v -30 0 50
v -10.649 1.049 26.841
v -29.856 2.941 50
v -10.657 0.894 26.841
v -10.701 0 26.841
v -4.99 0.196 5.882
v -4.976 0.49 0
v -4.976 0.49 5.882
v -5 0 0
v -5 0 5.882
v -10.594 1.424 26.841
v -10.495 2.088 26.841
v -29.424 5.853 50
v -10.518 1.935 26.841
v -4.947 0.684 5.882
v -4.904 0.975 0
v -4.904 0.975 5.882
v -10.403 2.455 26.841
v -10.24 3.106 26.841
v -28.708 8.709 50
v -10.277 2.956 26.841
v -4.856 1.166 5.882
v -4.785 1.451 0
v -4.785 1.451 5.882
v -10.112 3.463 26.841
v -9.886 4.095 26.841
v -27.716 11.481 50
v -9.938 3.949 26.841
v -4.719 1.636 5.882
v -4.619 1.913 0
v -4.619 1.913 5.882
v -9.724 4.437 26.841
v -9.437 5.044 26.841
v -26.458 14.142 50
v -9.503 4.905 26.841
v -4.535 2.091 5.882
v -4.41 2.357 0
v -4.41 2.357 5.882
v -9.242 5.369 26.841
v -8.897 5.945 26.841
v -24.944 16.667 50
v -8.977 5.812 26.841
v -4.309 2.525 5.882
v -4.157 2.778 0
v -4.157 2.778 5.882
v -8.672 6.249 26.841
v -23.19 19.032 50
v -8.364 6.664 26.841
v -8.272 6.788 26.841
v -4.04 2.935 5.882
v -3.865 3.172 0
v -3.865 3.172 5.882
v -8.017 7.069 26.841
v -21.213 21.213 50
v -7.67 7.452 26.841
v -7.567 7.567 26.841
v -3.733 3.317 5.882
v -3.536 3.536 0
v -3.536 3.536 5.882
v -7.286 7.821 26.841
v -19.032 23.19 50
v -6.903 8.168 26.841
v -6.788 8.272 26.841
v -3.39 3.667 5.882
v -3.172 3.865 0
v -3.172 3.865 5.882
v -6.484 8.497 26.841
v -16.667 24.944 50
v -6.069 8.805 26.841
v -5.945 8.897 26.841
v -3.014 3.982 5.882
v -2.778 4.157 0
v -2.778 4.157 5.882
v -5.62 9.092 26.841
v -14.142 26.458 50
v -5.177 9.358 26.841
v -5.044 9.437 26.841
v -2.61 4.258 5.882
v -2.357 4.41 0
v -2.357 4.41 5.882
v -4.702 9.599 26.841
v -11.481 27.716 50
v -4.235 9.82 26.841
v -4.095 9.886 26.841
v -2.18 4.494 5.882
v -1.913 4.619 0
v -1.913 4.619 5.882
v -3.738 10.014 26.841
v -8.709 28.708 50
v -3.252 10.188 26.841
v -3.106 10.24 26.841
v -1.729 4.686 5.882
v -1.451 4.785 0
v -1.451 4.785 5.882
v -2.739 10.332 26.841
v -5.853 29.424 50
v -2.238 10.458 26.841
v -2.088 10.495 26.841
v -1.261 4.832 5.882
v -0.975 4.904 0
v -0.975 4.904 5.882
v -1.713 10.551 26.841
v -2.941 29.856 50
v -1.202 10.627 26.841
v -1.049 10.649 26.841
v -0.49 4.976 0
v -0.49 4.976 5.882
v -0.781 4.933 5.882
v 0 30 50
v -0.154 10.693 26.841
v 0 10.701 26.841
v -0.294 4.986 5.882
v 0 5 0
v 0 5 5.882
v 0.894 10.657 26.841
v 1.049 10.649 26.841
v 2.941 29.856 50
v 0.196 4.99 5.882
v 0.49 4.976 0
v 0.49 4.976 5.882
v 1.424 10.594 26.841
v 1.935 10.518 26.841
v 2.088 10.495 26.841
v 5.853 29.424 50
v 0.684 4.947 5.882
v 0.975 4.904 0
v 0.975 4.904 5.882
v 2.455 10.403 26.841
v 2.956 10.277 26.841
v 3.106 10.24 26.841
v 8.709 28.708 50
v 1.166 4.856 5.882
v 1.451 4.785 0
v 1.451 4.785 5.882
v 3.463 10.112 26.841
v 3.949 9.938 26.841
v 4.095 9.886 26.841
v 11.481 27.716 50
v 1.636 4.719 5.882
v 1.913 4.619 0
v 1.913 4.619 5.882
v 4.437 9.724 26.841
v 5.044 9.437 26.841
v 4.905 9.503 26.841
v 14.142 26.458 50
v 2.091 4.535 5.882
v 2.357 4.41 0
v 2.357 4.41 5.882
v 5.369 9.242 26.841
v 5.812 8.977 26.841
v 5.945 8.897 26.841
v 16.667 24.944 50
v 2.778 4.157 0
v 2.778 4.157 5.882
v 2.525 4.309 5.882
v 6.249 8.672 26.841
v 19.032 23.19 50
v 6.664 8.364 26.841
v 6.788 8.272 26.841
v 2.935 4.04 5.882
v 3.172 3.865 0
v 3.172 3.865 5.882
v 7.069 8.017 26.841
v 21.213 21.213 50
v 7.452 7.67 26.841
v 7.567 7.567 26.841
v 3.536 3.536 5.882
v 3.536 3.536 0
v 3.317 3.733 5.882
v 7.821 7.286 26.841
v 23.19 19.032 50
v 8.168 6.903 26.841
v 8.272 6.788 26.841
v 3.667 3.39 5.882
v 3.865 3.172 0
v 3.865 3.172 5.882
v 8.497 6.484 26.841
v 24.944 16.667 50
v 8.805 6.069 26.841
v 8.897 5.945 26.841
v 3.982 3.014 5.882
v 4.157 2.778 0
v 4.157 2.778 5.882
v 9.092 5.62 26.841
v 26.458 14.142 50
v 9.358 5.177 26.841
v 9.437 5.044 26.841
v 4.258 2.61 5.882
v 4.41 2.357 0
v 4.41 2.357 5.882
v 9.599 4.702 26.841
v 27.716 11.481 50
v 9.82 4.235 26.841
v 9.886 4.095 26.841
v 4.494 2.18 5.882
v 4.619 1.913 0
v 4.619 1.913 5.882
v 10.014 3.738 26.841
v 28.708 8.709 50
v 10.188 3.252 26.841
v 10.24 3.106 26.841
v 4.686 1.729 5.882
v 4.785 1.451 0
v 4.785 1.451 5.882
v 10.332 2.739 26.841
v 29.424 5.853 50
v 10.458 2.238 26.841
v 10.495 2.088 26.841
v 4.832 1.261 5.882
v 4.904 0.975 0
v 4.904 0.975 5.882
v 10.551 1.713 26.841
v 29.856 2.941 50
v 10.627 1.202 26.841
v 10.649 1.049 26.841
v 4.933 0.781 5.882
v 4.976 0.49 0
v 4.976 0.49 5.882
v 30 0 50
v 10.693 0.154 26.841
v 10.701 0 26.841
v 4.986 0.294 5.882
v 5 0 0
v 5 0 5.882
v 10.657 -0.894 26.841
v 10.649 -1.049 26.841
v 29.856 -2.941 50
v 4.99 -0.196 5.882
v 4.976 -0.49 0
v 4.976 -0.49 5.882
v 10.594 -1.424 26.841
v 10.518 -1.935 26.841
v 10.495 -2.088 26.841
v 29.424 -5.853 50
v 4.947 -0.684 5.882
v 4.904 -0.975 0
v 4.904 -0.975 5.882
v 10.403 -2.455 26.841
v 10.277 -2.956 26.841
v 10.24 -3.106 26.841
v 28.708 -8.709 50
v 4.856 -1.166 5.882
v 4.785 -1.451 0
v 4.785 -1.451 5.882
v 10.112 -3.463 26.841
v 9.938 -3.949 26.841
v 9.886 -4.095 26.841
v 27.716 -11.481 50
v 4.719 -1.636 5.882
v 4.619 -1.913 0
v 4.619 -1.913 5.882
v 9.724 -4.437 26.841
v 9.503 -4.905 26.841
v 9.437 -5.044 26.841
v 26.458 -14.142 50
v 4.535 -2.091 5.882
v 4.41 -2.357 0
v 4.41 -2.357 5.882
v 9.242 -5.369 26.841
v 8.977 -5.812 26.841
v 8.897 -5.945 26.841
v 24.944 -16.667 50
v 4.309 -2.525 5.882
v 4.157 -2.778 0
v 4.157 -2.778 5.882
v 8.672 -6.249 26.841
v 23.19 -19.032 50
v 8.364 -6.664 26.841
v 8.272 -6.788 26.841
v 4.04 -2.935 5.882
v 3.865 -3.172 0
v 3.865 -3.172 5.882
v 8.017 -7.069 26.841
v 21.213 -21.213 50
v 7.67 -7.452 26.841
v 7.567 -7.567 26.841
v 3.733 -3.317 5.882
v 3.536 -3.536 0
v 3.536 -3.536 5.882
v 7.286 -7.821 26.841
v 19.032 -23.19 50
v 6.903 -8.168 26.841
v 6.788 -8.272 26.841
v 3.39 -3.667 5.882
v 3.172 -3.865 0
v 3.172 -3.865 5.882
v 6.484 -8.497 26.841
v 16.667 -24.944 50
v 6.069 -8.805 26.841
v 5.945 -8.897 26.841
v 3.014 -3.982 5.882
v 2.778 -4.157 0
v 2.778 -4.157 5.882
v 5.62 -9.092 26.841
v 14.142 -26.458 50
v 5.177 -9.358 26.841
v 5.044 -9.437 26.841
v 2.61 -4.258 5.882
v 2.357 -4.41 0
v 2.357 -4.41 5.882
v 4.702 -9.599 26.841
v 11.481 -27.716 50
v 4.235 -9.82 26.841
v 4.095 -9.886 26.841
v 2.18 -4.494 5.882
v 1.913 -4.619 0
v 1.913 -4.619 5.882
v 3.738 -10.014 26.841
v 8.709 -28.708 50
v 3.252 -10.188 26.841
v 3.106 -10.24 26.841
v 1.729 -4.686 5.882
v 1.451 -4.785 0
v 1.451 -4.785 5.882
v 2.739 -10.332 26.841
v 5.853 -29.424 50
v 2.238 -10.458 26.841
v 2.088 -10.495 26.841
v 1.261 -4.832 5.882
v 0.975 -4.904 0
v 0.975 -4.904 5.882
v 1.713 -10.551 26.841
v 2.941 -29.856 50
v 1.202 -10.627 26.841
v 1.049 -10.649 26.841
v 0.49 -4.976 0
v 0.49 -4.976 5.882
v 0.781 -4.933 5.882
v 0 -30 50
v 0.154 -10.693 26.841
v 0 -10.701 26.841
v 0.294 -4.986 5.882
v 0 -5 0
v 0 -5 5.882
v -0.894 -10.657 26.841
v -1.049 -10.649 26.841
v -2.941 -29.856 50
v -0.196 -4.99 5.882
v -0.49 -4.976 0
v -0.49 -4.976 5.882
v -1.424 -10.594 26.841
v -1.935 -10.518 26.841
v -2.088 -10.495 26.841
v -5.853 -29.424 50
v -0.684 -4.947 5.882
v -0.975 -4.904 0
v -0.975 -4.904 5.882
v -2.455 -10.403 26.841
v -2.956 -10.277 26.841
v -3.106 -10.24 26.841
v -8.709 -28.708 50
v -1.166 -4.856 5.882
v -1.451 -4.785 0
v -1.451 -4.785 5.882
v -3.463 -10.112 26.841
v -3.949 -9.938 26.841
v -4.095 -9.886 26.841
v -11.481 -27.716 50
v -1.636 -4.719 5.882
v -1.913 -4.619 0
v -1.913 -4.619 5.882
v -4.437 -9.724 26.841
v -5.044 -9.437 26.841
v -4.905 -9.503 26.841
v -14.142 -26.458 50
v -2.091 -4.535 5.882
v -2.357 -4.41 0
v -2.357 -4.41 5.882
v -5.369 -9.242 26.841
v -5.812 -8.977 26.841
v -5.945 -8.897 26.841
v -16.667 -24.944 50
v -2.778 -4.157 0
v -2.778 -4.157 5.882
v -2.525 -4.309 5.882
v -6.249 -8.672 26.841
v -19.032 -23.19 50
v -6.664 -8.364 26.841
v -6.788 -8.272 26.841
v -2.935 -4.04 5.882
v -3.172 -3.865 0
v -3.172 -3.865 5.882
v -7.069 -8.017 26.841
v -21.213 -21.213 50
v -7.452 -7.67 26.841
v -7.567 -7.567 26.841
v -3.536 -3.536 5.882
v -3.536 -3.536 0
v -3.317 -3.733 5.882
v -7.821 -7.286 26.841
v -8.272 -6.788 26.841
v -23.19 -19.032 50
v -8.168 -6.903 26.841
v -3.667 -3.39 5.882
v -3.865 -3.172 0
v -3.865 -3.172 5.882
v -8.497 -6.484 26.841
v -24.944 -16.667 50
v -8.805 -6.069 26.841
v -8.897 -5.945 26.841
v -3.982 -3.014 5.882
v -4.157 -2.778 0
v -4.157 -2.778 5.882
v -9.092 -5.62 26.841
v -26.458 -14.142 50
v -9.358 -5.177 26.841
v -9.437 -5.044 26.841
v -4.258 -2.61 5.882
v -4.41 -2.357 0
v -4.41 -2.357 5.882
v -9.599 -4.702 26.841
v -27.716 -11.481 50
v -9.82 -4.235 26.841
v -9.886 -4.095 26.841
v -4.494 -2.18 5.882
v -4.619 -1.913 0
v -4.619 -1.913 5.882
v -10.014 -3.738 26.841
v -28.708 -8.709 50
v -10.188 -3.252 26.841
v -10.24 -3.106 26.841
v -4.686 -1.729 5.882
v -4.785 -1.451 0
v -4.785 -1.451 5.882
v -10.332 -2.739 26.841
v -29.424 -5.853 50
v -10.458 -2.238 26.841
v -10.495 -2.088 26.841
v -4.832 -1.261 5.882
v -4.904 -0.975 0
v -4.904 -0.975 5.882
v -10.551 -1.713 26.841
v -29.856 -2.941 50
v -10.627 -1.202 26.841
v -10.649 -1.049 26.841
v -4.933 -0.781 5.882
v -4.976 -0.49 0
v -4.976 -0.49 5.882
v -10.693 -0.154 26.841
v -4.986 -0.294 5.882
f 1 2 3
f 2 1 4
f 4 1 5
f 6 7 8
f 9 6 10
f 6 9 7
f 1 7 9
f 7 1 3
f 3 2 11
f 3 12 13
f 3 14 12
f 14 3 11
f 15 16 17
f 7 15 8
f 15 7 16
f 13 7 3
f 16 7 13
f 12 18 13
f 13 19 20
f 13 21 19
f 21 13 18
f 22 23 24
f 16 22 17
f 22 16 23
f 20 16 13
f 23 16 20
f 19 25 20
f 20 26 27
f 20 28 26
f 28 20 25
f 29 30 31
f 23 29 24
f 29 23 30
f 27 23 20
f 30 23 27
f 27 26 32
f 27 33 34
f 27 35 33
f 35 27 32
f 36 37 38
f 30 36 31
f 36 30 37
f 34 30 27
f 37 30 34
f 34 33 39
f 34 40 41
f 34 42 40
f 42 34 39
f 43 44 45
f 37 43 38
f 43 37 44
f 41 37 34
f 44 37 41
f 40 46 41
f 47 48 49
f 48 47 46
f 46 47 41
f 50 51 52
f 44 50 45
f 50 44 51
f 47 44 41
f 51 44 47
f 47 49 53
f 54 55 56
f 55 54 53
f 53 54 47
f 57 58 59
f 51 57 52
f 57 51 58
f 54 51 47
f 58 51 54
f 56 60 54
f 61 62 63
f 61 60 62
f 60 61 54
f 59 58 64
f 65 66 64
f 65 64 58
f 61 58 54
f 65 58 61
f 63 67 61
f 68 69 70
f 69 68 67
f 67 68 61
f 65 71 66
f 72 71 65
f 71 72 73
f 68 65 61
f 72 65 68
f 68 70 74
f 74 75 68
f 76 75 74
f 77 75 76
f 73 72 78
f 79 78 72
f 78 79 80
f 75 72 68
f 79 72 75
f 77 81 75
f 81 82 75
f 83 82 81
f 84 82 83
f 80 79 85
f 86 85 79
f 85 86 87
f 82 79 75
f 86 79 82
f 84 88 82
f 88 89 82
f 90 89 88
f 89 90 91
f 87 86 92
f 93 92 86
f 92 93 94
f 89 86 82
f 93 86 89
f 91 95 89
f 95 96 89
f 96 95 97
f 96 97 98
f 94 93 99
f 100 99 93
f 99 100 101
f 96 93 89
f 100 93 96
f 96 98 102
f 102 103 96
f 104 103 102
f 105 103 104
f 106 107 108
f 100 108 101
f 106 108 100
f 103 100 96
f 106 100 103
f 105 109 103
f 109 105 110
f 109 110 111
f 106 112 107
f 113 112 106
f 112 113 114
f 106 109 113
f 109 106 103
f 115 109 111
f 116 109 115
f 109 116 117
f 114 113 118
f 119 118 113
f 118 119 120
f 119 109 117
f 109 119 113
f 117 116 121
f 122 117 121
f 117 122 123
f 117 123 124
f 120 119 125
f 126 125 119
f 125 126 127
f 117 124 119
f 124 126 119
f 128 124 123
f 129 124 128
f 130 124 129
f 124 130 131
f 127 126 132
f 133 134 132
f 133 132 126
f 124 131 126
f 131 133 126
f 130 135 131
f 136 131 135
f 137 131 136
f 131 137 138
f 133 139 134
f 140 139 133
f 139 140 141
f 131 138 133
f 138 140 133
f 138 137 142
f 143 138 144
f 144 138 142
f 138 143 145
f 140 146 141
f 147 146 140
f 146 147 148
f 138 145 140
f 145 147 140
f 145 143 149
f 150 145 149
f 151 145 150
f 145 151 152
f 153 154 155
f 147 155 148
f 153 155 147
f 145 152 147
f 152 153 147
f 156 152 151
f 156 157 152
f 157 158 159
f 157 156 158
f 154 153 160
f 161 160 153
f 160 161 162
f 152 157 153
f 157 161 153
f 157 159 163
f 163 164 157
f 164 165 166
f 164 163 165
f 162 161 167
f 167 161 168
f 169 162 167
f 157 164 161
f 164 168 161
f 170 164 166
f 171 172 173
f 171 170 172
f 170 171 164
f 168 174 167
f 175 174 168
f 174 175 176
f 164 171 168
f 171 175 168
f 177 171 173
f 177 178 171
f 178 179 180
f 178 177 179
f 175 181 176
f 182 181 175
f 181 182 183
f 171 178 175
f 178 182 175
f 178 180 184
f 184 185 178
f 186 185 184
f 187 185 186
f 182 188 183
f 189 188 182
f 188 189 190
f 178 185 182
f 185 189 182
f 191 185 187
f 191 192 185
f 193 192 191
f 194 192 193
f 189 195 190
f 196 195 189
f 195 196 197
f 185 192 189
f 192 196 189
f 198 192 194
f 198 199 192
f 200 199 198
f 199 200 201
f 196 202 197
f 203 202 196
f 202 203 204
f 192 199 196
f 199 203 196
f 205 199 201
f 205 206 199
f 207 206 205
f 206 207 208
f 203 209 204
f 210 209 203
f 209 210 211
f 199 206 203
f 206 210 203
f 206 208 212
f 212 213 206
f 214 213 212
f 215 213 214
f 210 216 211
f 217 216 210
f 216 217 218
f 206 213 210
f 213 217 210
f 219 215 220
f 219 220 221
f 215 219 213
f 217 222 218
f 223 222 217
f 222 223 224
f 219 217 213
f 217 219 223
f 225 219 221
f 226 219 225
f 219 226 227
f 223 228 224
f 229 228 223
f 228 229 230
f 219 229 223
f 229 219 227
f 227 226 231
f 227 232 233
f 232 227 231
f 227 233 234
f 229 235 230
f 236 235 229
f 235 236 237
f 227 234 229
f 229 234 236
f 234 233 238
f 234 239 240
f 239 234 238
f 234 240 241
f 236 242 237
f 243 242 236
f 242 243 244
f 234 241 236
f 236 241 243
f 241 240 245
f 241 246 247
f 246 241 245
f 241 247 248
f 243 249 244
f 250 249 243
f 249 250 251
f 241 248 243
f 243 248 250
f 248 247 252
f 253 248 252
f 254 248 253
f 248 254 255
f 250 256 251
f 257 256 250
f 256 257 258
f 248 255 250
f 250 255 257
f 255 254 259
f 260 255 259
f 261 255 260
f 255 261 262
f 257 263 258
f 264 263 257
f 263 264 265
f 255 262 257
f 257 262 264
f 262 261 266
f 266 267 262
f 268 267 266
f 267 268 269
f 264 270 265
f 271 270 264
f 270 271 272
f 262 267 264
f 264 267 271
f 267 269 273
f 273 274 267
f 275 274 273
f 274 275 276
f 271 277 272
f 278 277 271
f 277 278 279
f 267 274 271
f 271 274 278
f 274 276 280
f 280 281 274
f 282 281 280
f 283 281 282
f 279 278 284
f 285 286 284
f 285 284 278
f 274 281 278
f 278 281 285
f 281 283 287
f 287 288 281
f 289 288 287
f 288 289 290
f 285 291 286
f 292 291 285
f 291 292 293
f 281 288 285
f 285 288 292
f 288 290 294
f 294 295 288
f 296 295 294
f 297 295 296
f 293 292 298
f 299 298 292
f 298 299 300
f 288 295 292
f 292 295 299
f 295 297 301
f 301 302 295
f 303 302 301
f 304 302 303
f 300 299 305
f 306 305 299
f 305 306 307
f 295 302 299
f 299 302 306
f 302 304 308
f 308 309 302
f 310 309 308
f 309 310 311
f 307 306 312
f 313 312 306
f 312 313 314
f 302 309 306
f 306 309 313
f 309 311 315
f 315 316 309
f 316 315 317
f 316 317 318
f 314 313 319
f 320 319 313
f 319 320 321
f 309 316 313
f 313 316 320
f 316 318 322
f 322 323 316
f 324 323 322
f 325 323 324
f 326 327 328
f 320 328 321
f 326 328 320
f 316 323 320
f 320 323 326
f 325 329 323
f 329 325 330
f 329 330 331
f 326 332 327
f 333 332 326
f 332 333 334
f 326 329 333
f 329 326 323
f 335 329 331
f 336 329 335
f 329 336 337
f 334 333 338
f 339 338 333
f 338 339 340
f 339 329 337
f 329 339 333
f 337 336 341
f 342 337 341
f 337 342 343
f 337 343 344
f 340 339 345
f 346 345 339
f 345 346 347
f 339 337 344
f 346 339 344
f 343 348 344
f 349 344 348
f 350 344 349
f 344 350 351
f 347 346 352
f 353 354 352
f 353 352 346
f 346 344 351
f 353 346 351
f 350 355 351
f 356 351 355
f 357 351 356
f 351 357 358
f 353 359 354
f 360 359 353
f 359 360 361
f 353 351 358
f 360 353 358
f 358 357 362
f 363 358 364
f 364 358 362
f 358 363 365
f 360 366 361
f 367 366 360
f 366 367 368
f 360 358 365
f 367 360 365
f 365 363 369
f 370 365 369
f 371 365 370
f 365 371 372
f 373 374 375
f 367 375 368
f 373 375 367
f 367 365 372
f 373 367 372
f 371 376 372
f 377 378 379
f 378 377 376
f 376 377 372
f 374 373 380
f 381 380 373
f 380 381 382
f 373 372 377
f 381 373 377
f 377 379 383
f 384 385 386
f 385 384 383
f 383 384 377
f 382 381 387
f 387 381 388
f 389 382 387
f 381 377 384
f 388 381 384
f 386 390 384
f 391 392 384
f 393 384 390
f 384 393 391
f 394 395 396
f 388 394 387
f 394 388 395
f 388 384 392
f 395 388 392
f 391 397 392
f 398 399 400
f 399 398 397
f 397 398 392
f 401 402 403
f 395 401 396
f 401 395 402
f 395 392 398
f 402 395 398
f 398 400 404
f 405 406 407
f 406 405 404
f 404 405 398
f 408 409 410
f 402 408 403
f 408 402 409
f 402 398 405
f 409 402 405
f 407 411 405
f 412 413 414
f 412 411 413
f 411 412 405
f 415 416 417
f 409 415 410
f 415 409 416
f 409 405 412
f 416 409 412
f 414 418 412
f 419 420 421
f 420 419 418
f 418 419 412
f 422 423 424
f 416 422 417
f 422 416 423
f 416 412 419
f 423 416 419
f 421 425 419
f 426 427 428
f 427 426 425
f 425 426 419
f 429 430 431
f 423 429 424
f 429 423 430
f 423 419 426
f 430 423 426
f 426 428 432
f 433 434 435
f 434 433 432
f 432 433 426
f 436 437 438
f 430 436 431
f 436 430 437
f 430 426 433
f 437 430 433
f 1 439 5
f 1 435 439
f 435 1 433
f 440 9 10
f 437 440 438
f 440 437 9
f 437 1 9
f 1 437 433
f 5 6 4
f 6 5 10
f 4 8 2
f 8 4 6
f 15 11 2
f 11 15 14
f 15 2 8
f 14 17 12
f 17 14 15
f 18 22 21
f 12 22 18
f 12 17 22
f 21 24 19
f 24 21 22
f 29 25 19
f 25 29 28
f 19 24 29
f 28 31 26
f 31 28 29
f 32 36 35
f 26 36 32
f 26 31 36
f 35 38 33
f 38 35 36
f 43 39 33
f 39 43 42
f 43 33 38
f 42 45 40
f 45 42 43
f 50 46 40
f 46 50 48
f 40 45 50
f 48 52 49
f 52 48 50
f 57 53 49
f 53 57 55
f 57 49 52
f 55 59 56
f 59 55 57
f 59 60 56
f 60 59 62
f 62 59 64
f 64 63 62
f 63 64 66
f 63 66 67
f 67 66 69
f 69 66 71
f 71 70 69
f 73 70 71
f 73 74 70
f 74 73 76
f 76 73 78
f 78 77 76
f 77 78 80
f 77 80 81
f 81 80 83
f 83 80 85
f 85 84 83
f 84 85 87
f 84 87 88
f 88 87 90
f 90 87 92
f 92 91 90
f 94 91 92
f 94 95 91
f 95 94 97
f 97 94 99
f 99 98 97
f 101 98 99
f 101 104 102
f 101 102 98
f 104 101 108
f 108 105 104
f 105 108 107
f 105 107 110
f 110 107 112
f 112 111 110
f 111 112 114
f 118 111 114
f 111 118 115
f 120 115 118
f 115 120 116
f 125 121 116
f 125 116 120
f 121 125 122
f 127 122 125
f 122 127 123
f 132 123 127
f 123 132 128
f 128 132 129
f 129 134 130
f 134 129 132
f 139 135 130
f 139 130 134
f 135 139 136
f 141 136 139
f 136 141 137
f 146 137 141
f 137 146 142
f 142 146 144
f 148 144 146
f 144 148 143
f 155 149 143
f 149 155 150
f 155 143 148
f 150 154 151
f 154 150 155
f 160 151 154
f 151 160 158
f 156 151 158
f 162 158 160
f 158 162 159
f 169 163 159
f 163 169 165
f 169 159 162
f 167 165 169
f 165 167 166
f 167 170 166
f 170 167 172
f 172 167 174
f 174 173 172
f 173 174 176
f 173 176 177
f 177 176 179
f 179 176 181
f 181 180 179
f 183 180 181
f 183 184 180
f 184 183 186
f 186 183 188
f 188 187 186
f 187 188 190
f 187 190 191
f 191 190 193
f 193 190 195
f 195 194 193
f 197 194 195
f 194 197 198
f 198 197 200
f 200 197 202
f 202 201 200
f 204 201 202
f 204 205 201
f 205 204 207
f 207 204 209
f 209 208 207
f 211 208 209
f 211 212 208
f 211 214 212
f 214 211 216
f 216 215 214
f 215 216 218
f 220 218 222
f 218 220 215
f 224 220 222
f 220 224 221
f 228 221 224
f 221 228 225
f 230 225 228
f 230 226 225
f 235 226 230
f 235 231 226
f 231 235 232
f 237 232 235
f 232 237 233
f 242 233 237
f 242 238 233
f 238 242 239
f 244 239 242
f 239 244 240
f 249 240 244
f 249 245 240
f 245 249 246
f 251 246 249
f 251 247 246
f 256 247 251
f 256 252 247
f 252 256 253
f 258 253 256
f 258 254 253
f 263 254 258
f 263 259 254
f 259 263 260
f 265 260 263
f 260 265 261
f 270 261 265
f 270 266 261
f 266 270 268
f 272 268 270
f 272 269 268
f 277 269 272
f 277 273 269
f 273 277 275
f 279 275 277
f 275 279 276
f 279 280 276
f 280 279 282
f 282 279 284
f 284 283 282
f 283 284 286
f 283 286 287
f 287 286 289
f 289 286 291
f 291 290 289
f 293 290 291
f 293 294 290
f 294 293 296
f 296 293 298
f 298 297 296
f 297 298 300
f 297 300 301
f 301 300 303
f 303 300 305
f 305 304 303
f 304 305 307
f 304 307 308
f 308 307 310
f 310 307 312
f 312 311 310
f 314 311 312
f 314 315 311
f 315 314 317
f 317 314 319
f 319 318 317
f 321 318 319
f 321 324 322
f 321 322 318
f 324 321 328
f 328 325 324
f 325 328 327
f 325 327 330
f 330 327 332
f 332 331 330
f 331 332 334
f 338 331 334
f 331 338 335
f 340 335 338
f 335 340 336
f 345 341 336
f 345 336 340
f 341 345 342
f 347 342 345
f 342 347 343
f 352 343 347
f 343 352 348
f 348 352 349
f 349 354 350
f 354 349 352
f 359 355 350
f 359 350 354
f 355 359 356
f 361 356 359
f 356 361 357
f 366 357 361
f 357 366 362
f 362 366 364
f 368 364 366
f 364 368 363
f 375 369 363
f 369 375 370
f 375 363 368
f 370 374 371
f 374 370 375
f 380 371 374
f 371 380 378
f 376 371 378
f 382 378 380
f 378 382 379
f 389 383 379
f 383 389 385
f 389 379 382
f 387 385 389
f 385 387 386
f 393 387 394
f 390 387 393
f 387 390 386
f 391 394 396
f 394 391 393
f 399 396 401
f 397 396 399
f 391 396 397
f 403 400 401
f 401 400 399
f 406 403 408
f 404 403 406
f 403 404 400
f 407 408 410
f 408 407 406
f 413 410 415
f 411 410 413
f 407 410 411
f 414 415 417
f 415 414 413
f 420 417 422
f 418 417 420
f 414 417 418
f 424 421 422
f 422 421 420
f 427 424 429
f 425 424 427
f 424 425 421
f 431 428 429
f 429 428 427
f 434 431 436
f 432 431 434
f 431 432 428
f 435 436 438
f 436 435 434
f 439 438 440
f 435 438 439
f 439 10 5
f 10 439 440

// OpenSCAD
// Lab Funnel - A straight spout with a conical funnel on top.
// Printed upright (wide opening at top), resting on XY plane at z=0.

// Dimensions
spout_od   = 10;      // Outer diameter of the straight spout
spout_id   = 6.8;     // Inner diameter of the spout (spout_od - 2*wall)
spout_len  = 20;      // Length of the straight spout (z=0 to z=20)
funnel_h   = 30;      // Height of the conical part (z=20 to z=50)
funnel_od  = 60;      // Outer diameter at the top rim
funnel_id  = 34;      // Inner diameter at the top rim (funnel_od - 2*wall)
wall       = 1.6;     // Wall thickness everywhere

// Derived values
funnel_base_od = spout_od; // Outer diameter at the junction (z=20)
funnel_base_id = spout_id; // Inner diameter at the junction (z=20)

$fn = 64;

difference() {
    // Create the outer solid using rotate_extrude
    // Profile: Radius vs Height
    rotate_extrude($fn = 64) {
        polygon([
            [spout_od / 2, 0],
            [spout_od / 2, spout_len],
            [funnel_od / 2, spout_len + funnel_h]
        ]);
    }
    
    // Create the inner void (bore) using rotate_extrude
    // Profile: Radius vs Height
    rotate_extrude($fn = 64) {
        polygon([
            [spout_id / 2, 0],
            [spout_id / 2, spout_len],
            [funnel_id / 2, spout_len + funnel_h]
        ]);
    }
}
